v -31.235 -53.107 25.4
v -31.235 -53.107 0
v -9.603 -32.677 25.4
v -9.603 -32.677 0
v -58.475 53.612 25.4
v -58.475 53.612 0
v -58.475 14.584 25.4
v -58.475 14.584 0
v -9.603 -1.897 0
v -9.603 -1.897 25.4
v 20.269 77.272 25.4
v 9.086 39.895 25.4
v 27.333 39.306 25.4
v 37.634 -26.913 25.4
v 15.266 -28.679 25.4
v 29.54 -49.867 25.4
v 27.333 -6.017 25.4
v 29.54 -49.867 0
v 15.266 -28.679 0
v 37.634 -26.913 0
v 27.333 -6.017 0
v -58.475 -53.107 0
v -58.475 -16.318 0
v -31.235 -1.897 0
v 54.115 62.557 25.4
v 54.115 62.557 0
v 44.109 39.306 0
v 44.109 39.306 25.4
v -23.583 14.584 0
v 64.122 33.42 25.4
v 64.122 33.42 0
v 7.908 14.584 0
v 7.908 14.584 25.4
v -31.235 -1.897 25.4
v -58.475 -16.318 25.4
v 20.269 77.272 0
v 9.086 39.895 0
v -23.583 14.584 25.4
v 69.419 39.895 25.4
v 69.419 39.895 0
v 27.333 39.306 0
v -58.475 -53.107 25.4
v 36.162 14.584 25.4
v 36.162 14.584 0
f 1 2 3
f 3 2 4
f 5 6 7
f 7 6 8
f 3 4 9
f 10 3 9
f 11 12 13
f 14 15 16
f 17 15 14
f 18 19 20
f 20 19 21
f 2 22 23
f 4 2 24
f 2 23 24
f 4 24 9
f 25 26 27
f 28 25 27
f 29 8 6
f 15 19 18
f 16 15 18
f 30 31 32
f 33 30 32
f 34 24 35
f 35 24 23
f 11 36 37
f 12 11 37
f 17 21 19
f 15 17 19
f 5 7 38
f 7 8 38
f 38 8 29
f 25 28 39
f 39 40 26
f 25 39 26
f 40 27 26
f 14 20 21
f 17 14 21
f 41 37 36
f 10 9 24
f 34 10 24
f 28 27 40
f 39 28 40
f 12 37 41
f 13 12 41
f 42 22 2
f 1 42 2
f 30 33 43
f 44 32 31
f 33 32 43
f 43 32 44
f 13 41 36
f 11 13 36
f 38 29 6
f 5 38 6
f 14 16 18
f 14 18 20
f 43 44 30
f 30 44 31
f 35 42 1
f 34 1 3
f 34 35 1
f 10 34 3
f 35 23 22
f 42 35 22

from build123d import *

# Parameters (mm, degrees)
F1_DEPTH = 25.4


with BuildPart() as f1:
    # F0 (on Top) → F1 (new body)
    with BuildSketch(Plane.XY):
        Polygon((-23.582781, 14.584286), (-58.474906, 53.611768), (-58.474906, 14.584286), align=None)
        Polygon((64.121678, 33.420142), (7.908416, 14.584286), (36.162201, 14.584286), align=None)
        Polygon((-31.234847, -16.318291), (-58.474906, -16.318291), (-58.474906, -53.107075), (-31.234847, -27.50208), align=None)
        Polygon((-31.234847, -1.897085), (-58.474906, -16.318291), (-31.234847, -16.318291), align=None)
        Polygon((-31.234847, -27.50208), (-58.474906, -53.107075), (-31.234847, -53.107075), align=None)
        Polygon((-9.603042, -1.897085), (-31.234847, -16.318291), (-31.234847, -27.50208), (-9.603042, -32.677032), align=None)
        Polygon((-31.234847, -1.897085), (-31.234847, -16.318291), (-9.603042, -1.897085), align=None)
        Polygon((-31.234847, -27.50208), (-31.234847, -53.107075), (-9.603042, -32.677032), align=None)
        Polygon((20.269446, 77.27237), (9.085657, 39.894968), (27.332891, 39.306346), align=None)
        Polygon((44.108577, 39.306346), (69.419257, 39.894968), (54.115124, 62.556855), align=None)
        Polygon((37.633754, -26.91346), (27.332891, -6.017433), (15.266174, -28.679321), (29.53985, -49.866813), align=None)
    extrude(amount=F1_DEPTH)


solid = f1.part
